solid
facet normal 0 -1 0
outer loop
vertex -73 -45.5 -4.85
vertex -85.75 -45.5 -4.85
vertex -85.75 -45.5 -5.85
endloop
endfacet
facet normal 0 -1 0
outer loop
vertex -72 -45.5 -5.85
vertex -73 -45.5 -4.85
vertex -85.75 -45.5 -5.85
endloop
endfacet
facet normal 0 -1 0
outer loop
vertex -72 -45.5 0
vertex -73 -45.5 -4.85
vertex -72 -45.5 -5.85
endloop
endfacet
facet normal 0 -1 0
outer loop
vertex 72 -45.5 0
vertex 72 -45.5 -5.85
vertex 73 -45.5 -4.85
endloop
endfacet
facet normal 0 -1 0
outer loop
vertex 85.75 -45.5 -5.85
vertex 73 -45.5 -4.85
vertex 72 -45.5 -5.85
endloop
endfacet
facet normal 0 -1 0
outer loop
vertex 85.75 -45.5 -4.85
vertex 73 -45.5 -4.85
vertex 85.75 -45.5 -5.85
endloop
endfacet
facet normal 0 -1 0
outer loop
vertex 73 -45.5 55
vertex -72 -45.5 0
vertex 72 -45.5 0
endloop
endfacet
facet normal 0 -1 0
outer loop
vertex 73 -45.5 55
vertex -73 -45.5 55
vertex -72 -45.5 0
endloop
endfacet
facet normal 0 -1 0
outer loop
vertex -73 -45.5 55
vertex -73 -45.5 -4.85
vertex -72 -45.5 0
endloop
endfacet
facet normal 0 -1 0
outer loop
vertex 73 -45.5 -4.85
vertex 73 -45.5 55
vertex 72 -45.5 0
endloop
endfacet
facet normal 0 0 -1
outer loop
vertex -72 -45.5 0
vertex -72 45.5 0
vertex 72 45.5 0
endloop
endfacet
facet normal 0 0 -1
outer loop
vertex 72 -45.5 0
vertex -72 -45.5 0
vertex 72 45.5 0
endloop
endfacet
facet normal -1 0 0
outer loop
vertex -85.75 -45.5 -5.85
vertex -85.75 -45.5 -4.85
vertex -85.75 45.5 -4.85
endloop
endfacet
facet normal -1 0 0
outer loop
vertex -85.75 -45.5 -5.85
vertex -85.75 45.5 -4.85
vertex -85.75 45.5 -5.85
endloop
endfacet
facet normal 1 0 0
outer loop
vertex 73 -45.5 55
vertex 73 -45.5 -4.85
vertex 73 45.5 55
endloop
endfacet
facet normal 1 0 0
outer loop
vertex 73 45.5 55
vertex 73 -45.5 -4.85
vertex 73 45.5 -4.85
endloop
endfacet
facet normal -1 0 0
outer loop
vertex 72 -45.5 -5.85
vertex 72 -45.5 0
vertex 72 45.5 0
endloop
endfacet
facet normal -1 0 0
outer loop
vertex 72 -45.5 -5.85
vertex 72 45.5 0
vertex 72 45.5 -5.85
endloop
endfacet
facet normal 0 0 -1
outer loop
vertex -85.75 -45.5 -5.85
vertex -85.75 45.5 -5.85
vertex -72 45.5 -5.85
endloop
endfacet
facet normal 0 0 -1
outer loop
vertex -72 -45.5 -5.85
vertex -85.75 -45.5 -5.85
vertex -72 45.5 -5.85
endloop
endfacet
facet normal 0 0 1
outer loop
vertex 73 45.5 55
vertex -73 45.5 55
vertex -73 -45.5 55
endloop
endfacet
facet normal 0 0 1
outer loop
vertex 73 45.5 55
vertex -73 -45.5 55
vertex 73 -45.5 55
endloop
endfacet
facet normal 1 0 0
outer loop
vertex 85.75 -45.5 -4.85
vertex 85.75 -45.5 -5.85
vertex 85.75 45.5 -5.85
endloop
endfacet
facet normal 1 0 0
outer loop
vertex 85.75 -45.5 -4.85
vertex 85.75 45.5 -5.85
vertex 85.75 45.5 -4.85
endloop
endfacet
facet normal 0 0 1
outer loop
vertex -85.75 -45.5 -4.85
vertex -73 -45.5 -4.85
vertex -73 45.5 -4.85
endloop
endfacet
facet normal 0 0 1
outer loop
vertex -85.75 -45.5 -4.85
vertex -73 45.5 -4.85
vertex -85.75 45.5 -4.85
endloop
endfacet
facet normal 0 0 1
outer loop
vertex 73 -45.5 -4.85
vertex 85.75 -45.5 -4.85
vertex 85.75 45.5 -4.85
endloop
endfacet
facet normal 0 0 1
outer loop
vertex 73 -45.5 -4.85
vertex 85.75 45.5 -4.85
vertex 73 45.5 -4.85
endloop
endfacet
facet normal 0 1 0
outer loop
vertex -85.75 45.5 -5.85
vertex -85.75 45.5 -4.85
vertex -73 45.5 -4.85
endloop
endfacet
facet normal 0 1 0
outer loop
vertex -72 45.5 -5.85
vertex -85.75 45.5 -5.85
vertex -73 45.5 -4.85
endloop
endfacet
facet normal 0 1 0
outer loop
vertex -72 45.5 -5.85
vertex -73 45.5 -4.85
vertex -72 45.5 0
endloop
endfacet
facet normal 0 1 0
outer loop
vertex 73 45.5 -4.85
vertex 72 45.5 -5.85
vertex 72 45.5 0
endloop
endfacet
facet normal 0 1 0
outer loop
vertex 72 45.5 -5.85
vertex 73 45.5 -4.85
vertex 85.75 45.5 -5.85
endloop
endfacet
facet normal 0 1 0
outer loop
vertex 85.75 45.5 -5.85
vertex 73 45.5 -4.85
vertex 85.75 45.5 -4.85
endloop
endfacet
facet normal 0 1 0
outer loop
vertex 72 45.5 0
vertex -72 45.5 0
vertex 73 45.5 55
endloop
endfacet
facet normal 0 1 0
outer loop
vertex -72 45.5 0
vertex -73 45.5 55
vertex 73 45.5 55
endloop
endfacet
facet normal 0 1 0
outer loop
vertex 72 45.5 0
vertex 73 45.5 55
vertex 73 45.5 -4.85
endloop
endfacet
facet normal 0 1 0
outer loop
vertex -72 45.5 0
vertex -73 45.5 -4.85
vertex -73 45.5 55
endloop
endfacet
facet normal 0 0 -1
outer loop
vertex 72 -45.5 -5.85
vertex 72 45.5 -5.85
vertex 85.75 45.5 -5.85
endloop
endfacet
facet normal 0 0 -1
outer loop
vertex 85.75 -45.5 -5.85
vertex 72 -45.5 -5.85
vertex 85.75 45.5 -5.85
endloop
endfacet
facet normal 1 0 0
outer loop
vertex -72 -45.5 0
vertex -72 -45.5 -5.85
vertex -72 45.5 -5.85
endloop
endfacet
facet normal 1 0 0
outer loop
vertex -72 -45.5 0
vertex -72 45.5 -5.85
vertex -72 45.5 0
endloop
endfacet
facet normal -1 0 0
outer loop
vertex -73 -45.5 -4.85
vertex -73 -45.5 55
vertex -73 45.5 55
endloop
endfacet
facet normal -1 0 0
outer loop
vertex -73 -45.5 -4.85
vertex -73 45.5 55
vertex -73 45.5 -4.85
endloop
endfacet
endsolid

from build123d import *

# Parameters (mm, degrees)
F0_W     = 146
F0_H     = 91
F1_DEPTH = 55
F3_DEPTH = 91


with BuildPart() as f1:
    # F0 (on Top) → F1 (new body)
    with BuildSketch(Plane.XY):
        Rectangle(F0_W, F0_H)
    extrude(amount=F1_DEPTH)

    # F2 (on face) → F3 (join, through all)
    with BuildSketch(Plane.XZ.offset(45.5)):
        Polygon((-72, 0), (-73, 0), (-73, -4.85), (-85.75, -4.85), (-85.75, -5.85), (-73, -5.85), (-72, -5.85), align=None)
        Polygon((73, -4.85), (73, 0), (72, 0), (72, -5.85), (73, -5.85), (85.75, -5.85), (85.75, -4.85), align=None)
    extrude(amount=-F3_DEPTH)


solid = f1.part
